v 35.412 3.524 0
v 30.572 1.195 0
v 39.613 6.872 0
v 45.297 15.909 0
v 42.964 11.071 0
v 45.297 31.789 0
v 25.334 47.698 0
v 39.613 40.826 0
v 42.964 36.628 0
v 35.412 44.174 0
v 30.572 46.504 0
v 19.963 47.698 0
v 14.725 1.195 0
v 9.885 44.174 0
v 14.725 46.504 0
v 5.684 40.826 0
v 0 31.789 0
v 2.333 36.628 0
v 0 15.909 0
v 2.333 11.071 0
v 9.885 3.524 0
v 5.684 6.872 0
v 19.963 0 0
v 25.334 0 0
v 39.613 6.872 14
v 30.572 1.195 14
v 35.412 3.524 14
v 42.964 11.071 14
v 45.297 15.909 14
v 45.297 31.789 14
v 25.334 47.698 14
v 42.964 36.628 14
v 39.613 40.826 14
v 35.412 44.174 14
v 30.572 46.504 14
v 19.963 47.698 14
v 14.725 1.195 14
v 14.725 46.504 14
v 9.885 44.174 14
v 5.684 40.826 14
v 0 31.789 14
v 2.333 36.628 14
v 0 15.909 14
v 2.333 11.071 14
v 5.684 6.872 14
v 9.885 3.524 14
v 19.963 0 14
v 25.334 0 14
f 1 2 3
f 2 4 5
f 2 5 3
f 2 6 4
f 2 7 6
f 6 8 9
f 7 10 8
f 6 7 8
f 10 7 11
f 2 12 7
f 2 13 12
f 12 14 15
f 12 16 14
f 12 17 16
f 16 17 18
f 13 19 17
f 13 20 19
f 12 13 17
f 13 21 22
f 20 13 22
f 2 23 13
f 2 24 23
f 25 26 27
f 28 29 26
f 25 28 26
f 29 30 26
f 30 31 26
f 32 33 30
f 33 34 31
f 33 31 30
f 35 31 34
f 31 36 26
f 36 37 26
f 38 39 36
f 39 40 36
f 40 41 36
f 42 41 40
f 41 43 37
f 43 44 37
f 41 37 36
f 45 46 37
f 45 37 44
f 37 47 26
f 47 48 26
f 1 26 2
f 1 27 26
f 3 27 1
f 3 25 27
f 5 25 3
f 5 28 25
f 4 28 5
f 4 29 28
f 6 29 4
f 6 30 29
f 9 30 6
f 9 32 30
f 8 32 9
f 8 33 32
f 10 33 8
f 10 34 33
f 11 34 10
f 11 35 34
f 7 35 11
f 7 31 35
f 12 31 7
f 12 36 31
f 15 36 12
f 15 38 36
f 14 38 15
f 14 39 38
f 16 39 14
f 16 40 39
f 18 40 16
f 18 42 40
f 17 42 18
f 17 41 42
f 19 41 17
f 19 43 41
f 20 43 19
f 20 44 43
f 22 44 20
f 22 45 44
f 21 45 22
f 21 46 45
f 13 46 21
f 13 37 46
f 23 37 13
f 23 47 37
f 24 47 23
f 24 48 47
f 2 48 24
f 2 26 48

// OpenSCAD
$fn = 32;

// ----------------------------------------------------------------------
// Flat adaptor: double_d, 14 mm thick
// ----------------------------------------------------------------------

// --- parameters (mm) ---
profile_height = 14;      // extrusion height
profile_points = 24;      // points of the closed outline

profile = [[45.297, 31.789], [42.964, 36.628], [39.613, 40.826], [35.412, 44.174], [30.572, 46.504], [25.334, 47.698], [19.963, 47.698], [14.725, 46.504], [9.885, 44.174], [5.684, 40.826], [2.333, 36.628], [0, 31.789], [0, 15.909], [2.333, 11.071], [5.684, 6.872], [9.885, 3.524], [14.725, 1.195], [19.963, 0], [25.334, 0], [30.572, 1.195], [35.412, 3.524], [39.613, 6.872], [42.964, 11.071], [45.297, 15.909]];  // single closed polygon, 24 points, counter clockwise

// --- the one profile operation ---
linear_extrude(height = profile_height) polygon(points = profile);
